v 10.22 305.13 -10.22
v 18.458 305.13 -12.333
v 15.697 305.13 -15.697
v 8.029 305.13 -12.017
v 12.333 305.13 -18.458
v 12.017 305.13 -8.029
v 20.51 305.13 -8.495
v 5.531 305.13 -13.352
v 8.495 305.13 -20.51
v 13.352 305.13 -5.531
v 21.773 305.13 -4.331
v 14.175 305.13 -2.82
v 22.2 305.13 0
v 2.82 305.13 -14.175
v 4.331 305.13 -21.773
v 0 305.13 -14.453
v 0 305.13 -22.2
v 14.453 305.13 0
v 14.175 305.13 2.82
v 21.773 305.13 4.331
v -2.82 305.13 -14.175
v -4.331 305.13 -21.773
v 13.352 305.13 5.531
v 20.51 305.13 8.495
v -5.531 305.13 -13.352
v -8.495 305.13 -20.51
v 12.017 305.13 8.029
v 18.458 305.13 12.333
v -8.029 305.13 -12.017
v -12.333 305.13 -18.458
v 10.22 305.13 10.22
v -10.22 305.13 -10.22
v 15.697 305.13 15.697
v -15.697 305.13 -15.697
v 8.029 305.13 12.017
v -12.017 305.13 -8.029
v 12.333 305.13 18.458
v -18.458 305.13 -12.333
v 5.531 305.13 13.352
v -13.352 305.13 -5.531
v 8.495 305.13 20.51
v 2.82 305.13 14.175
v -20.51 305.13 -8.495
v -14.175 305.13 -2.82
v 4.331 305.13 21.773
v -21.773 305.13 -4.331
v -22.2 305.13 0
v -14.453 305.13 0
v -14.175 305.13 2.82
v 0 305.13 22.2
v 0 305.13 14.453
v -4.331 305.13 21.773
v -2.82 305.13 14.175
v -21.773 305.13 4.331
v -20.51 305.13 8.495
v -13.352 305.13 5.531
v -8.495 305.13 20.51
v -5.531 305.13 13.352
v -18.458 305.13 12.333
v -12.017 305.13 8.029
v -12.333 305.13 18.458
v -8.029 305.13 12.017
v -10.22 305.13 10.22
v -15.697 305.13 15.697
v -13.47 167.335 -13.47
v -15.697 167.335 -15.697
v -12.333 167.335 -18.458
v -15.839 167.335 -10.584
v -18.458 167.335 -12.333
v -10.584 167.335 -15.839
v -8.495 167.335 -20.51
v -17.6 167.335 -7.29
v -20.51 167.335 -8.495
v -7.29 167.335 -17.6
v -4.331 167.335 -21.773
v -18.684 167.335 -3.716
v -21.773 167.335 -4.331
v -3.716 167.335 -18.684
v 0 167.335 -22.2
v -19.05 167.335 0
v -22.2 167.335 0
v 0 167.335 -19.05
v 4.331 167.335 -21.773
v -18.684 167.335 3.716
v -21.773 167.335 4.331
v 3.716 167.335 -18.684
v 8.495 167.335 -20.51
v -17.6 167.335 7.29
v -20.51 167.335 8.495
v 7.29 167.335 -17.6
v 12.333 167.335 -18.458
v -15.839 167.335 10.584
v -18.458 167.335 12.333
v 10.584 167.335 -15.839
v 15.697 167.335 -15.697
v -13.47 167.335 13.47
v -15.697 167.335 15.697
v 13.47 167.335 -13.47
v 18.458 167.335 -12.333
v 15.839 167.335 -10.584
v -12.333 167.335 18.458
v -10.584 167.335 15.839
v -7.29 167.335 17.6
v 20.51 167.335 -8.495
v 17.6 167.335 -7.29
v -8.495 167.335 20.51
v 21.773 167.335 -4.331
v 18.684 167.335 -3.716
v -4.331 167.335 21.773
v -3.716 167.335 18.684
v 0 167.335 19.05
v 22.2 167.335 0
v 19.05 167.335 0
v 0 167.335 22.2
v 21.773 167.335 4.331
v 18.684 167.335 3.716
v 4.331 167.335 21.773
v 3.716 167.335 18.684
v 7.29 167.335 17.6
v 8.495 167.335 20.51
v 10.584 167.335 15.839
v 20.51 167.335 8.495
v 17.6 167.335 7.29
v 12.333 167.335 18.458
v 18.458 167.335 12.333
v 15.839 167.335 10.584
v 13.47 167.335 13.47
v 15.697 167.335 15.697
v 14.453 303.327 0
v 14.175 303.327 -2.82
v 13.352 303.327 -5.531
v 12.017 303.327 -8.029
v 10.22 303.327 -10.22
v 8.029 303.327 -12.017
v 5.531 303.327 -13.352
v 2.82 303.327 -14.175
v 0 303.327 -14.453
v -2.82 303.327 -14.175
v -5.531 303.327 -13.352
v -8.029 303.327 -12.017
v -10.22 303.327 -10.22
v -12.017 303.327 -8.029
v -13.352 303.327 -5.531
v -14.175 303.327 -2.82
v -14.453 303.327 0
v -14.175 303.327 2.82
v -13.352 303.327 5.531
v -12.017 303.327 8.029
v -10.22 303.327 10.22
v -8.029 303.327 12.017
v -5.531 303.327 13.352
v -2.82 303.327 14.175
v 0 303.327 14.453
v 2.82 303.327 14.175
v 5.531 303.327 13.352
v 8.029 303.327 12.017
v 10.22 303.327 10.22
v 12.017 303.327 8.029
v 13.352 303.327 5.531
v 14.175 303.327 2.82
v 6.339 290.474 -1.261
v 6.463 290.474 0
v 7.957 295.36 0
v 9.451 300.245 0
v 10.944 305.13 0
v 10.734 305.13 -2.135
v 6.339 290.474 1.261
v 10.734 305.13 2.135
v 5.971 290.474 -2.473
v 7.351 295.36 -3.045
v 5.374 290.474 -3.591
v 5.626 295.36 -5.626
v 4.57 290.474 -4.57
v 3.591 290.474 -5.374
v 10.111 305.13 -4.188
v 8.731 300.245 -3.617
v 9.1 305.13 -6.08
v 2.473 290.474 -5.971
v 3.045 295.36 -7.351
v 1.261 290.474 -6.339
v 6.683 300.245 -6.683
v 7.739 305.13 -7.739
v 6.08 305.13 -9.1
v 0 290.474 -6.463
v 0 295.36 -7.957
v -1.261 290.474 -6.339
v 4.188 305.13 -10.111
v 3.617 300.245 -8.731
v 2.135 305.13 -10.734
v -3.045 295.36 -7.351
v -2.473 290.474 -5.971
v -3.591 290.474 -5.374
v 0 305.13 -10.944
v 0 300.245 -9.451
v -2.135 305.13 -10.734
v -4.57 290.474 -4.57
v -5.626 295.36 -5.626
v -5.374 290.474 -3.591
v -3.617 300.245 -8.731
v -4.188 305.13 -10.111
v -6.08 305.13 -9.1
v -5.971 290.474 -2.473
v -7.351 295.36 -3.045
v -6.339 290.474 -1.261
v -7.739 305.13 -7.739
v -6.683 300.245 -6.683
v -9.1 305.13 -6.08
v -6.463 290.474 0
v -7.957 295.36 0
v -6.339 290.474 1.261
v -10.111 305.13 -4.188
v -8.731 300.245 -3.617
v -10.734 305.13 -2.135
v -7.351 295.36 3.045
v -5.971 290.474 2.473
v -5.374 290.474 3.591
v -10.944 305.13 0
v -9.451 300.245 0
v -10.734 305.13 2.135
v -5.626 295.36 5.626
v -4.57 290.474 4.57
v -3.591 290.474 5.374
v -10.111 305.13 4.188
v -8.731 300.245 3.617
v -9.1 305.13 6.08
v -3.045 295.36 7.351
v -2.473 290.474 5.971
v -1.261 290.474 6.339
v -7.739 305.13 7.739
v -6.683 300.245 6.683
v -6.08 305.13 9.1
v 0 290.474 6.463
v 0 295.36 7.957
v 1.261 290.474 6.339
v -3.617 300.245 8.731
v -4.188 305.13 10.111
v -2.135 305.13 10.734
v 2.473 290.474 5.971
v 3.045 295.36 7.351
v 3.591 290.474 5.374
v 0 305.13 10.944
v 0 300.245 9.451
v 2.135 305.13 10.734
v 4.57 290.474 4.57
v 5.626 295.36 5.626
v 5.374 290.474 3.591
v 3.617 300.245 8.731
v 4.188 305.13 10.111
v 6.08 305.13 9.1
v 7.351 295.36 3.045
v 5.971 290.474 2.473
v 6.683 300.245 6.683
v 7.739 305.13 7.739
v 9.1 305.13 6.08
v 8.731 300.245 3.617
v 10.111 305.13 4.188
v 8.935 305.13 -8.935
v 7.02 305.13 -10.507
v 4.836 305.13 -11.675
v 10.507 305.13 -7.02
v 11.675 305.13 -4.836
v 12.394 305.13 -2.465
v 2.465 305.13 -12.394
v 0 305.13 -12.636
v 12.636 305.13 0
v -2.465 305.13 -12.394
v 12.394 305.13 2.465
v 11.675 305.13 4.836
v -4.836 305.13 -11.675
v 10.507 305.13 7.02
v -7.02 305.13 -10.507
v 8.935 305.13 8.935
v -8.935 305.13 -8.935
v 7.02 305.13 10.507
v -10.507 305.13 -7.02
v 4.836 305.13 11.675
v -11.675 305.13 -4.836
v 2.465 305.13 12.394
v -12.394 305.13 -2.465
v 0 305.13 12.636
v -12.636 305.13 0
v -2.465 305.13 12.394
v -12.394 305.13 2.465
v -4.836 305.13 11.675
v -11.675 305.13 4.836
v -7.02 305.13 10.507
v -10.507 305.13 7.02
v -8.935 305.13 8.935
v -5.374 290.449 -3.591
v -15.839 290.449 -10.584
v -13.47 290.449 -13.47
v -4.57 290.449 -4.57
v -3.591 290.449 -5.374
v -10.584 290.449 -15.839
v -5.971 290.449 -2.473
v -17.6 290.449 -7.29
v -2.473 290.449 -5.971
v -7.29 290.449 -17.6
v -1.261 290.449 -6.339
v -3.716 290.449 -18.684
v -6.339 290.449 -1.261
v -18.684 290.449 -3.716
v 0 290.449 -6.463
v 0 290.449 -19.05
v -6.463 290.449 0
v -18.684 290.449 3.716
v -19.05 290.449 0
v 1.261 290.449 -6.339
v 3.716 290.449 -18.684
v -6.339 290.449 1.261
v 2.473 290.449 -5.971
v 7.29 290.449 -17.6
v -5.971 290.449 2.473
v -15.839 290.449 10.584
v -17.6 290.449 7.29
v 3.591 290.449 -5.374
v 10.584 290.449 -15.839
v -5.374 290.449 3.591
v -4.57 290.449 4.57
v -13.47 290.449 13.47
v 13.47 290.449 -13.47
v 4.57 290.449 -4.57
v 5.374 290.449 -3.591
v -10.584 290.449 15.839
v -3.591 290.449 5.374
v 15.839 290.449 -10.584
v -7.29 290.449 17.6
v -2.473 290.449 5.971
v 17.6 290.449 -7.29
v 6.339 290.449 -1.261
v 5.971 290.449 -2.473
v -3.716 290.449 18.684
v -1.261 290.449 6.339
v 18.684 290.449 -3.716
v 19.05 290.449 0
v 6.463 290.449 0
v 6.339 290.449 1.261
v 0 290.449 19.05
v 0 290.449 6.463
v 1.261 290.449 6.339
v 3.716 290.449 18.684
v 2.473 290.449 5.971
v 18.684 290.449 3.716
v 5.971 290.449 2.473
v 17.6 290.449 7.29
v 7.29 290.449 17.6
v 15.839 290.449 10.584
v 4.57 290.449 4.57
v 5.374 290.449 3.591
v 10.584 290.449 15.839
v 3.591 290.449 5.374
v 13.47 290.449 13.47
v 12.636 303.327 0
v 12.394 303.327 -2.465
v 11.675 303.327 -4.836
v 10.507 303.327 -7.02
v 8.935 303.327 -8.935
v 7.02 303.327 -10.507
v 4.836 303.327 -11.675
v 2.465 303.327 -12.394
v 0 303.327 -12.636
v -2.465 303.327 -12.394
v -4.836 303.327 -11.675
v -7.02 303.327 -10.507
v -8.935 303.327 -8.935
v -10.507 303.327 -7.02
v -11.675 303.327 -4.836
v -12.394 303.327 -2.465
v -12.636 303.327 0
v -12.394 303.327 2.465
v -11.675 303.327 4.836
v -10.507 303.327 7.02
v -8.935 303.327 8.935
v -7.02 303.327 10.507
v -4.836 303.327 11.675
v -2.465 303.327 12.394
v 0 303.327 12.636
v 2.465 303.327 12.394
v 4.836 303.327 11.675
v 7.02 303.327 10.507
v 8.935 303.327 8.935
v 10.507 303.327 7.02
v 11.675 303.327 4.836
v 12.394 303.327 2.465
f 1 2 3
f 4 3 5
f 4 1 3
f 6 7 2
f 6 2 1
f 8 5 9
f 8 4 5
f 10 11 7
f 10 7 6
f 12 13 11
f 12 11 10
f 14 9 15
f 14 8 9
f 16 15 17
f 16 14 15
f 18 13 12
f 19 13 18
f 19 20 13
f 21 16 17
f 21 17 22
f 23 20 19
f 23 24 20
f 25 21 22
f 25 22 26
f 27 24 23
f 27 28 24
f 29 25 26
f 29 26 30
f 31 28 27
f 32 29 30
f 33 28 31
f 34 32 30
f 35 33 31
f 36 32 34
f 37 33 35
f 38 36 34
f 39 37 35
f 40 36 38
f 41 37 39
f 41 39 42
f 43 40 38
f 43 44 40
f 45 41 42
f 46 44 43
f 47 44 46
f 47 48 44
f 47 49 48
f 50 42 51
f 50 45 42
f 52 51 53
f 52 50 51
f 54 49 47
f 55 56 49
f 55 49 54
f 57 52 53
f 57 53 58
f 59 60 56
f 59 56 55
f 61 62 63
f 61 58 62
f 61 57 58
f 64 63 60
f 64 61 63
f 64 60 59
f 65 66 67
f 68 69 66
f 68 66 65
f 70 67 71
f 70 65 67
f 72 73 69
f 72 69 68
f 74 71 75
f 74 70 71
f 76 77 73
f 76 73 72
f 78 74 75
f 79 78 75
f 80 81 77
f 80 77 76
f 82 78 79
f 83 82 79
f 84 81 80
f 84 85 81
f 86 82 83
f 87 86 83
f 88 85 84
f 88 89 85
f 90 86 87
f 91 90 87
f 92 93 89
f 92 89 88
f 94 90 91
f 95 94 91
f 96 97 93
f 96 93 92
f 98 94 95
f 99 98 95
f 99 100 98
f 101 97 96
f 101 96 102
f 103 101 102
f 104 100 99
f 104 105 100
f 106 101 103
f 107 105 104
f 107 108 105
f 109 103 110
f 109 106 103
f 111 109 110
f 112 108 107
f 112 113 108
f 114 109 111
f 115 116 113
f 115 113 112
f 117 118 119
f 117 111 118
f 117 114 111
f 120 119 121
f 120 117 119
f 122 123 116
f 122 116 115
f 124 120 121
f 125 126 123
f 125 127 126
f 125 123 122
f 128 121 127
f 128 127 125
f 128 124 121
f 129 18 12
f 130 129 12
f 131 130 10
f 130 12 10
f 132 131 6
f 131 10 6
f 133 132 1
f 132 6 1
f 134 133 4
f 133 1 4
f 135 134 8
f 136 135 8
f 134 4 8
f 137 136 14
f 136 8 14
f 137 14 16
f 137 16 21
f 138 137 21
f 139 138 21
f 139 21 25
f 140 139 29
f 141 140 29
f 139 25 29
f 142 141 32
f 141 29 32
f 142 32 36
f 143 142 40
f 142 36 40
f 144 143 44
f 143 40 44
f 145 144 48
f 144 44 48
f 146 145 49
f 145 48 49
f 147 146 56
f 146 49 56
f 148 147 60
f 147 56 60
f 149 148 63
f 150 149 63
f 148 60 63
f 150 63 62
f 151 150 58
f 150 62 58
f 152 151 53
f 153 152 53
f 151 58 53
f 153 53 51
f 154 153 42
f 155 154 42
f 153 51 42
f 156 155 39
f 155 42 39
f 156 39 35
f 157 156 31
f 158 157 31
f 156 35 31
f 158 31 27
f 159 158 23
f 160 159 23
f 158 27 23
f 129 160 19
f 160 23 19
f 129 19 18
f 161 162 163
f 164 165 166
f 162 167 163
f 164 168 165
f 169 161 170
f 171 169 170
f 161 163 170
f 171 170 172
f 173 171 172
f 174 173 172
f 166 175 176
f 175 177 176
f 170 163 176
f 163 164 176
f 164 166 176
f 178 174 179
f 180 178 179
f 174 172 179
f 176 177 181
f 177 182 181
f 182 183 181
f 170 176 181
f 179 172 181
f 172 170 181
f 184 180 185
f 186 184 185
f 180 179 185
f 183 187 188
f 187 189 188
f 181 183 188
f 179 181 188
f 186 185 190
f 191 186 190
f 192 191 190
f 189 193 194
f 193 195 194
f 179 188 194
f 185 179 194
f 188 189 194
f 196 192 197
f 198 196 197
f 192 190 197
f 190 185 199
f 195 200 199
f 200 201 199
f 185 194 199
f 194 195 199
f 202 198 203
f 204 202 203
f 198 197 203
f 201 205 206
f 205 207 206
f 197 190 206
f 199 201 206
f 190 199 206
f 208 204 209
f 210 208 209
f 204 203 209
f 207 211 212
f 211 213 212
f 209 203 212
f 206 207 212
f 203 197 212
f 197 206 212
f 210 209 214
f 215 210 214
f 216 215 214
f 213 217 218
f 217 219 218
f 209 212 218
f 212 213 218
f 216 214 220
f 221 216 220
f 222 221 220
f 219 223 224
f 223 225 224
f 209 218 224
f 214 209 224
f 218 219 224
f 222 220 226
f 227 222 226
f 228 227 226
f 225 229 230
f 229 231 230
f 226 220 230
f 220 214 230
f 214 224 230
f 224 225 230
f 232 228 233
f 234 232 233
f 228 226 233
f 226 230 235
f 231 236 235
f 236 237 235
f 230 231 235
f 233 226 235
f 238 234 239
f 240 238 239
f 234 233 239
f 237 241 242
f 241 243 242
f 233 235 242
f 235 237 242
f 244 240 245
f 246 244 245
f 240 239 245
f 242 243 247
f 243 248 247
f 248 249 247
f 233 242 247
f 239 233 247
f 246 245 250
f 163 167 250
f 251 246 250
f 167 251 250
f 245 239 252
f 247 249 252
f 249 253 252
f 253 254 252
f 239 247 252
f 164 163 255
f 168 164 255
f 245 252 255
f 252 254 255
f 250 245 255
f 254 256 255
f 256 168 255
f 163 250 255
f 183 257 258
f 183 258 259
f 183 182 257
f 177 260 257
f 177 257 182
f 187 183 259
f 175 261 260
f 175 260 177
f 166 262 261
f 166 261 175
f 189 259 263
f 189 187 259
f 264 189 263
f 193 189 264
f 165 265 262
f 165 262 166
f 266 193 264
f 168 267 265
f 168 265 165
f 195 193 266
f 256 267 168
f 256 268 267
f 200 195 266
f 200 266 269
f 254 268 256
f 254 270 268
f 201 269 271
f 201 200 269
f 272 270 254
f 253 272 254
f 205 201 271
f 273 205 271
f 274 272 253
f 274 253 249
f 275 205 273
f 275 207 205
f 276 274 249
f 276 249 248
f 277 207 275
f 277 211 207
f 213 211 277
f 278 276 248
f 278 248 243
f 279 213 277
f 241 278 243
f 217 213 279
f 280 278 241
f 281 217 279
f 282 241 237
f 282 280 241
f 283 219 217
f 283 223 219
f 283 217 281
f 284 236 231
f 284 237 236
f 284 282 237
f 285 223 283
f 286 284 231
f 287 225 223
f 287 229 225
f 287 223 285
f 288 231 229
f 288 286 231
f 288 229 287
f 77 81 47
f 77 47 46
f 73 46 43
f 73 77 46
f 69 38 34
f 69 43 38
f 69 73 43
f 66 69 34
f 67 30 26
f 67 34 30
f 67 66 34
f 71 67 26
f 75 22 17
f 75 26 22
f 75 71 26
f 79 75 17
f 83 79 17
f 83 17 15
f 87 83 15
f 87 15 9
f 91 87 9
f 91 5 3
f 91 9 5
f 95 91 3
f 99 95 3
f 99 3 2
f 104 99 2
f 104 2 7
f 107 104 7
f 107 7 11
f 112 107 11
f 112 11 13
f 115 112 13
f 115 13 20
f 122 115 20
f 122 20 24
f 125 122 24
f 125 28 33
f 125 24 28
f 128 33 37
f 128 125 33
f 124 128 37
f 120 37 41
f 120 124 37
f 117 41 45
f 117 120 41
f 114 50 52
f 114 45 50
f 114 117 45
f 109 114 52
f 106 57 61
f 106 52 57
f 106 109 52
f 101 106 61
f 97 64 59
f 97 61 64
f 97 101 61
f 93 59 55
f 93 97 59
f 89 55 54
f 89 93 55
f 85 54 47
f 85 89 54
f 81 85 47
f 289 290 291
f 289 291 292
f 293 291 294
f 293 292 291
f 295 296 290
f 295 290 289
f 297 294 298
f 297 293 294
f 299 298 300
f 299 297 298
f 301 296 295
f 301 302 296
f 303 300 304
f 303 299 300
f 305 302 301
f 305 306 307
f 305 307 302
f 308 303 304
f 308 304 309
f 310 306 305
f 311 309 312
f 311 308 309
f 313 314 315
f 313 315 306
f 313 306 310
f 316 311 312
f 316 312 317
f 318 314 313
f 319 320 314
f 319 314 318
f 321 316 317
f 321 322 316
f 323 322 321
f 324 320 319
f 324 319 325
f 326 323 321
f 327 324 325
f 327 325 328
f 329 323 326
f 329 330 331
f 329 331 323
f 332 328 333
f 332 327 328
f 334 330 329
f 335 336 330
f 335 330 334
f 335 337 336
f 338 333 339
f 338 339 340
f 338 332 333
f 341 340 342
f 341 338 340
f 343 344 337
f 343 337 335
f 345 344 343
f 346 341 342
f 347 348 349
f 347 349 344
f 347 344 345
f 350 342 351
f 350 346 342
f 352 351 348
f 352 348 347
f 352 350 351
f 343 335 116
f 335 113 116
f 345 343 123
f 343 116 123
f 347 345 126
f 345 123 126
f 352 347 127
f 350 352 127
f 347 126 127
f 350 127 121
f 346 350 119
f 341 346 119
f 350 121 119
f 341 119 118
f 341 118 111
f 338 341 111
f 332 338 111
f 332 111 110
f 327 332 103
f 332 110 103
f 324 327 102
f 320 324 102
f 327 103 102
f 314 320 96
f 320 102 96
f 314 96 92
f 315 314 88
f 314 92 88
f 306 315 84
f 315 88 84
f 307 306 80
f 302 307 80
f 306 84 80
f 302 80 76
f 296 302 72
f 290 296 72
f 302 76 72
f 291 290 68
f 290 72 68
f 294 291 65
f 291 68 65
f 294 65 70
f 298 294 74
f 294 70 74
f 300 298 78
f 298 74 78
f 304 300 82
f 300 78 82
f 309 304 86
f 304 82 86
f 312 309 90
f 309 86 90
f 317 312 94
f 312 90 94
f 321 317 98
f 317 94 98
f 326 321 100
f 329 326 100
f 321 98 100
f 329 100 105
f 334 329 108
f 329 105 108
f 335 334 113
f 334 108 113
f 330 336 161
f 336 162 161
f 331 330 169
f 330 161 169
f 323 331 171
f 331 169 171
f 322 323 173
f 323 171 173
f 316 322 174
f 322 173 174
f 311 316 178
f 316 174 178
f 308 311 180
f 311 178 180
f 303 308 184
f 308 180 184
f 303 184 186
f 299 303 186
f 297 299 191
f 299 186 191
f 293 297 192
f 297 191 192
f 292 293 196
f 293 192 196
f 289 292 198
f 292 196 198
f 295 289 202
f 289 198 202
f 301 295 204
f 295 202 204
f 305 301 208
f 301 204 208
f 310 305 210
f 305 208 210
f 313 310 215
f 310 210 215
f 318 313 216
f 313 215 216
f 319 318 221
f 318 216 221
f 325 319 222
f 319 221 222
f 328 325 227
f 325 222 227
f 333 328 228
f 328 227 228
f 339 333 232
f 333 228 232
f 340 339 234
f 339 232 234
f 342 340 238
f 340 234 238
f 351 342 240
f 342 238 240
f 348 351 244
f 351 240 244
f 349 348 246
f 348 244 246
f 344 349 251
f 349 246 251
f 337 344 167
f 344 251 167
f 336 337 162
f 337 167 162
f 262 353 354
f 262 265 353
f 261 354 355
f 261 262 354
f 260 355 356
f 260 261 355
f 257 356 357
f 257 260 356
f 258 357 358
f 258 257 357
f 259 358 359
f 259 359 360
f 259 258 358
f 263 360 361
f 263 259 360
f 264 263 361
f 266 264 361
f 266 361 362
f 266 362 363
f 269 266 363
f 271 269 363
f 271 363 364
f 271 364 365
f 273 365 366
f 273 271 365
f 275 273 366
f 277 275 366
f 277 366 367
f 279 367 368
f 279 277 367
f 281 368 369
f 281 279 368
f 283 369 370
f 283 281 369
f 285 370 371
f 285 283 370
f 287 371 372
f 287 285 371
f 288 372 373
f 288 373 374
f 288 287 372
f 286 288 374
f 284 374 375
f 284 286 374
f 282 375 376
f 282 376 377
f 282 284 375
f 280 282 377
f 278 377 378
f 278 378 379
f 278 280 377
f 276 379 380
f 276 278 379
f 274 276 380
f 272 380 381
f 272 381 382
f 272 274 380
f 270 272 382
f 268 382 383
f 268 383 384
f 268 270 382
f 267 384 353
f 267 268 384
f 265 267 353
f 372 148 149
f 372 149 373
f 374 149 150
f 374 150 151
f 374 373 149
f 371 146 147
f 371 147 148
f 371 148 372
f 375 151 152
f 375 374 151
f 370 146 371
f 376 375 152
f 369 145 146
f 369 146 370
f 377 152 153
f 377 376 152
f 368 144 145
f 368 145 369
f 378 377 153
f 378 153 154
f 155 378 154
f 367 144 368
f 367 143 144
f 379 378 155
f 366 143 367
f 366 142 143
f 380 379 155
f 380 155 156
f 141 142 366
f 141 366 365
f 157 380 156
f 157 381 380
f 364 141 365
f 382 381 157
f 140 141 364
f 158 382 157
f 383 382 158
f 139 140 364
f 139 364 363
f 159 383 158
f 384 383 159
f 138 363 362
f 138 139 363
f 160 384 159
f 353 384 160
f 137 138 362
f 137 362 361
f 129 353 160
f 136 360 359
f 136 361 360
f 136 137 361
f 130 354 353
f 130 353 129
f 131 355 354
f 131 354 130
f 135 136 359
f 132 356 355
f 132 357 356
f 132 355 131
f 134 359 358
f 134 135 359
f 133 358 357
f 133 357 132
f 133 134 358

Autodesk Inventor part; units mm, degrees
ref_plane "YZ Plane" through (0, 0, 0) normal (1, 0, 0) x (0, 1, 0)
ref_plane "XZ Plane" through (0, 0, 0) normal (0, 1, 0) x (-1, 0, 0)
ref_plane "XY Plane" through (0, 0, 0) normal (0, 0, 1) x (1, 0, 0)
sketch "Sketch1" plane through (0, 0, 0) normal (0, 1, 0) x (-1, 0, 0)
  circle A0 centre (0, 0) radius 22.1996
  dimension "d0" = 44.3992
extrude "Extrusion1" add sketch "Sketch1" along normal blind 305.1302
sketch "Sketch2" plane through (0, 305.1302, 0) normal (0, 1, 0) x (1, 0, 0)
  circle A0 centre (0, 0) radius 14.4526
  circle A1 centre (0, 0) radius 12.6365
  dimension "d3" = 28.9052
  dimension "d4" = 25.273
extrude "Extrusion2" cut sketch "Sketch2" against normal blind 1.8034
sketch "Sketch3" plane through (0, 305.1302, 0) normal (0, 1, 0) x (1, 0, 0)
  circle A0 centre (0, 0) radius 10.9441
  circle A1 centre (0, 0) radius 12.6365 projected
  dimension "d7" = 1.6924
extrude "Extrusion3" cut sketch "Sketch3" against normal blind 14.6558 draft -17 contours A0
sketch "Sketch5" plane through (0, 290.4744, 0) normal (0, 1, 0) x (1, 0, 0)
  circle A0 centre (0, 0) radius 6.4634
extrude "Extrusion4" cut sketch "Sketch5" against normal blind 355.6
sketch "Sketch6" plane through (0, 0, 0) normal (0, -1, 0) x (1, 0, 0)
  circle A0 centre (0, 0) radius 19.05
  circle A1 centre (0, 0) radius 22.1996
  dimension "d13" = 38.1
  dimension "d14" = 44.3992
extrude "Extrusion5" cut sketch "Sketch6" against normal blind 290.449 contours A0
sketch "Sketch7" plane through (0, 0, 0) normal (0, -1, 0) x (1, 0, 0)
  circle A0 centre (0, 0) radius 22.1996
extrude "Extrusion6" cut sketch "Sketch7" against normal blind 167.3352
sketch "Sketch8" plane through (0, 305.1302, 0) normal (0, 1, 0) x (1, 0, 0)
  point P0 (0, 0)
  point P1 (18.415, 0)
  point P2 (9.2075, 15.9479)
  point P3 (-9.2075, 15.9479)
  point P4 (-18.415, 0)
  point P5 (-9.2075, -15.9479)
  point P6 (9.2075, -15.9479)
  dimension "d19" = 18.415
  dimension "d22" = 360
properties part number "LED holder Thing"
